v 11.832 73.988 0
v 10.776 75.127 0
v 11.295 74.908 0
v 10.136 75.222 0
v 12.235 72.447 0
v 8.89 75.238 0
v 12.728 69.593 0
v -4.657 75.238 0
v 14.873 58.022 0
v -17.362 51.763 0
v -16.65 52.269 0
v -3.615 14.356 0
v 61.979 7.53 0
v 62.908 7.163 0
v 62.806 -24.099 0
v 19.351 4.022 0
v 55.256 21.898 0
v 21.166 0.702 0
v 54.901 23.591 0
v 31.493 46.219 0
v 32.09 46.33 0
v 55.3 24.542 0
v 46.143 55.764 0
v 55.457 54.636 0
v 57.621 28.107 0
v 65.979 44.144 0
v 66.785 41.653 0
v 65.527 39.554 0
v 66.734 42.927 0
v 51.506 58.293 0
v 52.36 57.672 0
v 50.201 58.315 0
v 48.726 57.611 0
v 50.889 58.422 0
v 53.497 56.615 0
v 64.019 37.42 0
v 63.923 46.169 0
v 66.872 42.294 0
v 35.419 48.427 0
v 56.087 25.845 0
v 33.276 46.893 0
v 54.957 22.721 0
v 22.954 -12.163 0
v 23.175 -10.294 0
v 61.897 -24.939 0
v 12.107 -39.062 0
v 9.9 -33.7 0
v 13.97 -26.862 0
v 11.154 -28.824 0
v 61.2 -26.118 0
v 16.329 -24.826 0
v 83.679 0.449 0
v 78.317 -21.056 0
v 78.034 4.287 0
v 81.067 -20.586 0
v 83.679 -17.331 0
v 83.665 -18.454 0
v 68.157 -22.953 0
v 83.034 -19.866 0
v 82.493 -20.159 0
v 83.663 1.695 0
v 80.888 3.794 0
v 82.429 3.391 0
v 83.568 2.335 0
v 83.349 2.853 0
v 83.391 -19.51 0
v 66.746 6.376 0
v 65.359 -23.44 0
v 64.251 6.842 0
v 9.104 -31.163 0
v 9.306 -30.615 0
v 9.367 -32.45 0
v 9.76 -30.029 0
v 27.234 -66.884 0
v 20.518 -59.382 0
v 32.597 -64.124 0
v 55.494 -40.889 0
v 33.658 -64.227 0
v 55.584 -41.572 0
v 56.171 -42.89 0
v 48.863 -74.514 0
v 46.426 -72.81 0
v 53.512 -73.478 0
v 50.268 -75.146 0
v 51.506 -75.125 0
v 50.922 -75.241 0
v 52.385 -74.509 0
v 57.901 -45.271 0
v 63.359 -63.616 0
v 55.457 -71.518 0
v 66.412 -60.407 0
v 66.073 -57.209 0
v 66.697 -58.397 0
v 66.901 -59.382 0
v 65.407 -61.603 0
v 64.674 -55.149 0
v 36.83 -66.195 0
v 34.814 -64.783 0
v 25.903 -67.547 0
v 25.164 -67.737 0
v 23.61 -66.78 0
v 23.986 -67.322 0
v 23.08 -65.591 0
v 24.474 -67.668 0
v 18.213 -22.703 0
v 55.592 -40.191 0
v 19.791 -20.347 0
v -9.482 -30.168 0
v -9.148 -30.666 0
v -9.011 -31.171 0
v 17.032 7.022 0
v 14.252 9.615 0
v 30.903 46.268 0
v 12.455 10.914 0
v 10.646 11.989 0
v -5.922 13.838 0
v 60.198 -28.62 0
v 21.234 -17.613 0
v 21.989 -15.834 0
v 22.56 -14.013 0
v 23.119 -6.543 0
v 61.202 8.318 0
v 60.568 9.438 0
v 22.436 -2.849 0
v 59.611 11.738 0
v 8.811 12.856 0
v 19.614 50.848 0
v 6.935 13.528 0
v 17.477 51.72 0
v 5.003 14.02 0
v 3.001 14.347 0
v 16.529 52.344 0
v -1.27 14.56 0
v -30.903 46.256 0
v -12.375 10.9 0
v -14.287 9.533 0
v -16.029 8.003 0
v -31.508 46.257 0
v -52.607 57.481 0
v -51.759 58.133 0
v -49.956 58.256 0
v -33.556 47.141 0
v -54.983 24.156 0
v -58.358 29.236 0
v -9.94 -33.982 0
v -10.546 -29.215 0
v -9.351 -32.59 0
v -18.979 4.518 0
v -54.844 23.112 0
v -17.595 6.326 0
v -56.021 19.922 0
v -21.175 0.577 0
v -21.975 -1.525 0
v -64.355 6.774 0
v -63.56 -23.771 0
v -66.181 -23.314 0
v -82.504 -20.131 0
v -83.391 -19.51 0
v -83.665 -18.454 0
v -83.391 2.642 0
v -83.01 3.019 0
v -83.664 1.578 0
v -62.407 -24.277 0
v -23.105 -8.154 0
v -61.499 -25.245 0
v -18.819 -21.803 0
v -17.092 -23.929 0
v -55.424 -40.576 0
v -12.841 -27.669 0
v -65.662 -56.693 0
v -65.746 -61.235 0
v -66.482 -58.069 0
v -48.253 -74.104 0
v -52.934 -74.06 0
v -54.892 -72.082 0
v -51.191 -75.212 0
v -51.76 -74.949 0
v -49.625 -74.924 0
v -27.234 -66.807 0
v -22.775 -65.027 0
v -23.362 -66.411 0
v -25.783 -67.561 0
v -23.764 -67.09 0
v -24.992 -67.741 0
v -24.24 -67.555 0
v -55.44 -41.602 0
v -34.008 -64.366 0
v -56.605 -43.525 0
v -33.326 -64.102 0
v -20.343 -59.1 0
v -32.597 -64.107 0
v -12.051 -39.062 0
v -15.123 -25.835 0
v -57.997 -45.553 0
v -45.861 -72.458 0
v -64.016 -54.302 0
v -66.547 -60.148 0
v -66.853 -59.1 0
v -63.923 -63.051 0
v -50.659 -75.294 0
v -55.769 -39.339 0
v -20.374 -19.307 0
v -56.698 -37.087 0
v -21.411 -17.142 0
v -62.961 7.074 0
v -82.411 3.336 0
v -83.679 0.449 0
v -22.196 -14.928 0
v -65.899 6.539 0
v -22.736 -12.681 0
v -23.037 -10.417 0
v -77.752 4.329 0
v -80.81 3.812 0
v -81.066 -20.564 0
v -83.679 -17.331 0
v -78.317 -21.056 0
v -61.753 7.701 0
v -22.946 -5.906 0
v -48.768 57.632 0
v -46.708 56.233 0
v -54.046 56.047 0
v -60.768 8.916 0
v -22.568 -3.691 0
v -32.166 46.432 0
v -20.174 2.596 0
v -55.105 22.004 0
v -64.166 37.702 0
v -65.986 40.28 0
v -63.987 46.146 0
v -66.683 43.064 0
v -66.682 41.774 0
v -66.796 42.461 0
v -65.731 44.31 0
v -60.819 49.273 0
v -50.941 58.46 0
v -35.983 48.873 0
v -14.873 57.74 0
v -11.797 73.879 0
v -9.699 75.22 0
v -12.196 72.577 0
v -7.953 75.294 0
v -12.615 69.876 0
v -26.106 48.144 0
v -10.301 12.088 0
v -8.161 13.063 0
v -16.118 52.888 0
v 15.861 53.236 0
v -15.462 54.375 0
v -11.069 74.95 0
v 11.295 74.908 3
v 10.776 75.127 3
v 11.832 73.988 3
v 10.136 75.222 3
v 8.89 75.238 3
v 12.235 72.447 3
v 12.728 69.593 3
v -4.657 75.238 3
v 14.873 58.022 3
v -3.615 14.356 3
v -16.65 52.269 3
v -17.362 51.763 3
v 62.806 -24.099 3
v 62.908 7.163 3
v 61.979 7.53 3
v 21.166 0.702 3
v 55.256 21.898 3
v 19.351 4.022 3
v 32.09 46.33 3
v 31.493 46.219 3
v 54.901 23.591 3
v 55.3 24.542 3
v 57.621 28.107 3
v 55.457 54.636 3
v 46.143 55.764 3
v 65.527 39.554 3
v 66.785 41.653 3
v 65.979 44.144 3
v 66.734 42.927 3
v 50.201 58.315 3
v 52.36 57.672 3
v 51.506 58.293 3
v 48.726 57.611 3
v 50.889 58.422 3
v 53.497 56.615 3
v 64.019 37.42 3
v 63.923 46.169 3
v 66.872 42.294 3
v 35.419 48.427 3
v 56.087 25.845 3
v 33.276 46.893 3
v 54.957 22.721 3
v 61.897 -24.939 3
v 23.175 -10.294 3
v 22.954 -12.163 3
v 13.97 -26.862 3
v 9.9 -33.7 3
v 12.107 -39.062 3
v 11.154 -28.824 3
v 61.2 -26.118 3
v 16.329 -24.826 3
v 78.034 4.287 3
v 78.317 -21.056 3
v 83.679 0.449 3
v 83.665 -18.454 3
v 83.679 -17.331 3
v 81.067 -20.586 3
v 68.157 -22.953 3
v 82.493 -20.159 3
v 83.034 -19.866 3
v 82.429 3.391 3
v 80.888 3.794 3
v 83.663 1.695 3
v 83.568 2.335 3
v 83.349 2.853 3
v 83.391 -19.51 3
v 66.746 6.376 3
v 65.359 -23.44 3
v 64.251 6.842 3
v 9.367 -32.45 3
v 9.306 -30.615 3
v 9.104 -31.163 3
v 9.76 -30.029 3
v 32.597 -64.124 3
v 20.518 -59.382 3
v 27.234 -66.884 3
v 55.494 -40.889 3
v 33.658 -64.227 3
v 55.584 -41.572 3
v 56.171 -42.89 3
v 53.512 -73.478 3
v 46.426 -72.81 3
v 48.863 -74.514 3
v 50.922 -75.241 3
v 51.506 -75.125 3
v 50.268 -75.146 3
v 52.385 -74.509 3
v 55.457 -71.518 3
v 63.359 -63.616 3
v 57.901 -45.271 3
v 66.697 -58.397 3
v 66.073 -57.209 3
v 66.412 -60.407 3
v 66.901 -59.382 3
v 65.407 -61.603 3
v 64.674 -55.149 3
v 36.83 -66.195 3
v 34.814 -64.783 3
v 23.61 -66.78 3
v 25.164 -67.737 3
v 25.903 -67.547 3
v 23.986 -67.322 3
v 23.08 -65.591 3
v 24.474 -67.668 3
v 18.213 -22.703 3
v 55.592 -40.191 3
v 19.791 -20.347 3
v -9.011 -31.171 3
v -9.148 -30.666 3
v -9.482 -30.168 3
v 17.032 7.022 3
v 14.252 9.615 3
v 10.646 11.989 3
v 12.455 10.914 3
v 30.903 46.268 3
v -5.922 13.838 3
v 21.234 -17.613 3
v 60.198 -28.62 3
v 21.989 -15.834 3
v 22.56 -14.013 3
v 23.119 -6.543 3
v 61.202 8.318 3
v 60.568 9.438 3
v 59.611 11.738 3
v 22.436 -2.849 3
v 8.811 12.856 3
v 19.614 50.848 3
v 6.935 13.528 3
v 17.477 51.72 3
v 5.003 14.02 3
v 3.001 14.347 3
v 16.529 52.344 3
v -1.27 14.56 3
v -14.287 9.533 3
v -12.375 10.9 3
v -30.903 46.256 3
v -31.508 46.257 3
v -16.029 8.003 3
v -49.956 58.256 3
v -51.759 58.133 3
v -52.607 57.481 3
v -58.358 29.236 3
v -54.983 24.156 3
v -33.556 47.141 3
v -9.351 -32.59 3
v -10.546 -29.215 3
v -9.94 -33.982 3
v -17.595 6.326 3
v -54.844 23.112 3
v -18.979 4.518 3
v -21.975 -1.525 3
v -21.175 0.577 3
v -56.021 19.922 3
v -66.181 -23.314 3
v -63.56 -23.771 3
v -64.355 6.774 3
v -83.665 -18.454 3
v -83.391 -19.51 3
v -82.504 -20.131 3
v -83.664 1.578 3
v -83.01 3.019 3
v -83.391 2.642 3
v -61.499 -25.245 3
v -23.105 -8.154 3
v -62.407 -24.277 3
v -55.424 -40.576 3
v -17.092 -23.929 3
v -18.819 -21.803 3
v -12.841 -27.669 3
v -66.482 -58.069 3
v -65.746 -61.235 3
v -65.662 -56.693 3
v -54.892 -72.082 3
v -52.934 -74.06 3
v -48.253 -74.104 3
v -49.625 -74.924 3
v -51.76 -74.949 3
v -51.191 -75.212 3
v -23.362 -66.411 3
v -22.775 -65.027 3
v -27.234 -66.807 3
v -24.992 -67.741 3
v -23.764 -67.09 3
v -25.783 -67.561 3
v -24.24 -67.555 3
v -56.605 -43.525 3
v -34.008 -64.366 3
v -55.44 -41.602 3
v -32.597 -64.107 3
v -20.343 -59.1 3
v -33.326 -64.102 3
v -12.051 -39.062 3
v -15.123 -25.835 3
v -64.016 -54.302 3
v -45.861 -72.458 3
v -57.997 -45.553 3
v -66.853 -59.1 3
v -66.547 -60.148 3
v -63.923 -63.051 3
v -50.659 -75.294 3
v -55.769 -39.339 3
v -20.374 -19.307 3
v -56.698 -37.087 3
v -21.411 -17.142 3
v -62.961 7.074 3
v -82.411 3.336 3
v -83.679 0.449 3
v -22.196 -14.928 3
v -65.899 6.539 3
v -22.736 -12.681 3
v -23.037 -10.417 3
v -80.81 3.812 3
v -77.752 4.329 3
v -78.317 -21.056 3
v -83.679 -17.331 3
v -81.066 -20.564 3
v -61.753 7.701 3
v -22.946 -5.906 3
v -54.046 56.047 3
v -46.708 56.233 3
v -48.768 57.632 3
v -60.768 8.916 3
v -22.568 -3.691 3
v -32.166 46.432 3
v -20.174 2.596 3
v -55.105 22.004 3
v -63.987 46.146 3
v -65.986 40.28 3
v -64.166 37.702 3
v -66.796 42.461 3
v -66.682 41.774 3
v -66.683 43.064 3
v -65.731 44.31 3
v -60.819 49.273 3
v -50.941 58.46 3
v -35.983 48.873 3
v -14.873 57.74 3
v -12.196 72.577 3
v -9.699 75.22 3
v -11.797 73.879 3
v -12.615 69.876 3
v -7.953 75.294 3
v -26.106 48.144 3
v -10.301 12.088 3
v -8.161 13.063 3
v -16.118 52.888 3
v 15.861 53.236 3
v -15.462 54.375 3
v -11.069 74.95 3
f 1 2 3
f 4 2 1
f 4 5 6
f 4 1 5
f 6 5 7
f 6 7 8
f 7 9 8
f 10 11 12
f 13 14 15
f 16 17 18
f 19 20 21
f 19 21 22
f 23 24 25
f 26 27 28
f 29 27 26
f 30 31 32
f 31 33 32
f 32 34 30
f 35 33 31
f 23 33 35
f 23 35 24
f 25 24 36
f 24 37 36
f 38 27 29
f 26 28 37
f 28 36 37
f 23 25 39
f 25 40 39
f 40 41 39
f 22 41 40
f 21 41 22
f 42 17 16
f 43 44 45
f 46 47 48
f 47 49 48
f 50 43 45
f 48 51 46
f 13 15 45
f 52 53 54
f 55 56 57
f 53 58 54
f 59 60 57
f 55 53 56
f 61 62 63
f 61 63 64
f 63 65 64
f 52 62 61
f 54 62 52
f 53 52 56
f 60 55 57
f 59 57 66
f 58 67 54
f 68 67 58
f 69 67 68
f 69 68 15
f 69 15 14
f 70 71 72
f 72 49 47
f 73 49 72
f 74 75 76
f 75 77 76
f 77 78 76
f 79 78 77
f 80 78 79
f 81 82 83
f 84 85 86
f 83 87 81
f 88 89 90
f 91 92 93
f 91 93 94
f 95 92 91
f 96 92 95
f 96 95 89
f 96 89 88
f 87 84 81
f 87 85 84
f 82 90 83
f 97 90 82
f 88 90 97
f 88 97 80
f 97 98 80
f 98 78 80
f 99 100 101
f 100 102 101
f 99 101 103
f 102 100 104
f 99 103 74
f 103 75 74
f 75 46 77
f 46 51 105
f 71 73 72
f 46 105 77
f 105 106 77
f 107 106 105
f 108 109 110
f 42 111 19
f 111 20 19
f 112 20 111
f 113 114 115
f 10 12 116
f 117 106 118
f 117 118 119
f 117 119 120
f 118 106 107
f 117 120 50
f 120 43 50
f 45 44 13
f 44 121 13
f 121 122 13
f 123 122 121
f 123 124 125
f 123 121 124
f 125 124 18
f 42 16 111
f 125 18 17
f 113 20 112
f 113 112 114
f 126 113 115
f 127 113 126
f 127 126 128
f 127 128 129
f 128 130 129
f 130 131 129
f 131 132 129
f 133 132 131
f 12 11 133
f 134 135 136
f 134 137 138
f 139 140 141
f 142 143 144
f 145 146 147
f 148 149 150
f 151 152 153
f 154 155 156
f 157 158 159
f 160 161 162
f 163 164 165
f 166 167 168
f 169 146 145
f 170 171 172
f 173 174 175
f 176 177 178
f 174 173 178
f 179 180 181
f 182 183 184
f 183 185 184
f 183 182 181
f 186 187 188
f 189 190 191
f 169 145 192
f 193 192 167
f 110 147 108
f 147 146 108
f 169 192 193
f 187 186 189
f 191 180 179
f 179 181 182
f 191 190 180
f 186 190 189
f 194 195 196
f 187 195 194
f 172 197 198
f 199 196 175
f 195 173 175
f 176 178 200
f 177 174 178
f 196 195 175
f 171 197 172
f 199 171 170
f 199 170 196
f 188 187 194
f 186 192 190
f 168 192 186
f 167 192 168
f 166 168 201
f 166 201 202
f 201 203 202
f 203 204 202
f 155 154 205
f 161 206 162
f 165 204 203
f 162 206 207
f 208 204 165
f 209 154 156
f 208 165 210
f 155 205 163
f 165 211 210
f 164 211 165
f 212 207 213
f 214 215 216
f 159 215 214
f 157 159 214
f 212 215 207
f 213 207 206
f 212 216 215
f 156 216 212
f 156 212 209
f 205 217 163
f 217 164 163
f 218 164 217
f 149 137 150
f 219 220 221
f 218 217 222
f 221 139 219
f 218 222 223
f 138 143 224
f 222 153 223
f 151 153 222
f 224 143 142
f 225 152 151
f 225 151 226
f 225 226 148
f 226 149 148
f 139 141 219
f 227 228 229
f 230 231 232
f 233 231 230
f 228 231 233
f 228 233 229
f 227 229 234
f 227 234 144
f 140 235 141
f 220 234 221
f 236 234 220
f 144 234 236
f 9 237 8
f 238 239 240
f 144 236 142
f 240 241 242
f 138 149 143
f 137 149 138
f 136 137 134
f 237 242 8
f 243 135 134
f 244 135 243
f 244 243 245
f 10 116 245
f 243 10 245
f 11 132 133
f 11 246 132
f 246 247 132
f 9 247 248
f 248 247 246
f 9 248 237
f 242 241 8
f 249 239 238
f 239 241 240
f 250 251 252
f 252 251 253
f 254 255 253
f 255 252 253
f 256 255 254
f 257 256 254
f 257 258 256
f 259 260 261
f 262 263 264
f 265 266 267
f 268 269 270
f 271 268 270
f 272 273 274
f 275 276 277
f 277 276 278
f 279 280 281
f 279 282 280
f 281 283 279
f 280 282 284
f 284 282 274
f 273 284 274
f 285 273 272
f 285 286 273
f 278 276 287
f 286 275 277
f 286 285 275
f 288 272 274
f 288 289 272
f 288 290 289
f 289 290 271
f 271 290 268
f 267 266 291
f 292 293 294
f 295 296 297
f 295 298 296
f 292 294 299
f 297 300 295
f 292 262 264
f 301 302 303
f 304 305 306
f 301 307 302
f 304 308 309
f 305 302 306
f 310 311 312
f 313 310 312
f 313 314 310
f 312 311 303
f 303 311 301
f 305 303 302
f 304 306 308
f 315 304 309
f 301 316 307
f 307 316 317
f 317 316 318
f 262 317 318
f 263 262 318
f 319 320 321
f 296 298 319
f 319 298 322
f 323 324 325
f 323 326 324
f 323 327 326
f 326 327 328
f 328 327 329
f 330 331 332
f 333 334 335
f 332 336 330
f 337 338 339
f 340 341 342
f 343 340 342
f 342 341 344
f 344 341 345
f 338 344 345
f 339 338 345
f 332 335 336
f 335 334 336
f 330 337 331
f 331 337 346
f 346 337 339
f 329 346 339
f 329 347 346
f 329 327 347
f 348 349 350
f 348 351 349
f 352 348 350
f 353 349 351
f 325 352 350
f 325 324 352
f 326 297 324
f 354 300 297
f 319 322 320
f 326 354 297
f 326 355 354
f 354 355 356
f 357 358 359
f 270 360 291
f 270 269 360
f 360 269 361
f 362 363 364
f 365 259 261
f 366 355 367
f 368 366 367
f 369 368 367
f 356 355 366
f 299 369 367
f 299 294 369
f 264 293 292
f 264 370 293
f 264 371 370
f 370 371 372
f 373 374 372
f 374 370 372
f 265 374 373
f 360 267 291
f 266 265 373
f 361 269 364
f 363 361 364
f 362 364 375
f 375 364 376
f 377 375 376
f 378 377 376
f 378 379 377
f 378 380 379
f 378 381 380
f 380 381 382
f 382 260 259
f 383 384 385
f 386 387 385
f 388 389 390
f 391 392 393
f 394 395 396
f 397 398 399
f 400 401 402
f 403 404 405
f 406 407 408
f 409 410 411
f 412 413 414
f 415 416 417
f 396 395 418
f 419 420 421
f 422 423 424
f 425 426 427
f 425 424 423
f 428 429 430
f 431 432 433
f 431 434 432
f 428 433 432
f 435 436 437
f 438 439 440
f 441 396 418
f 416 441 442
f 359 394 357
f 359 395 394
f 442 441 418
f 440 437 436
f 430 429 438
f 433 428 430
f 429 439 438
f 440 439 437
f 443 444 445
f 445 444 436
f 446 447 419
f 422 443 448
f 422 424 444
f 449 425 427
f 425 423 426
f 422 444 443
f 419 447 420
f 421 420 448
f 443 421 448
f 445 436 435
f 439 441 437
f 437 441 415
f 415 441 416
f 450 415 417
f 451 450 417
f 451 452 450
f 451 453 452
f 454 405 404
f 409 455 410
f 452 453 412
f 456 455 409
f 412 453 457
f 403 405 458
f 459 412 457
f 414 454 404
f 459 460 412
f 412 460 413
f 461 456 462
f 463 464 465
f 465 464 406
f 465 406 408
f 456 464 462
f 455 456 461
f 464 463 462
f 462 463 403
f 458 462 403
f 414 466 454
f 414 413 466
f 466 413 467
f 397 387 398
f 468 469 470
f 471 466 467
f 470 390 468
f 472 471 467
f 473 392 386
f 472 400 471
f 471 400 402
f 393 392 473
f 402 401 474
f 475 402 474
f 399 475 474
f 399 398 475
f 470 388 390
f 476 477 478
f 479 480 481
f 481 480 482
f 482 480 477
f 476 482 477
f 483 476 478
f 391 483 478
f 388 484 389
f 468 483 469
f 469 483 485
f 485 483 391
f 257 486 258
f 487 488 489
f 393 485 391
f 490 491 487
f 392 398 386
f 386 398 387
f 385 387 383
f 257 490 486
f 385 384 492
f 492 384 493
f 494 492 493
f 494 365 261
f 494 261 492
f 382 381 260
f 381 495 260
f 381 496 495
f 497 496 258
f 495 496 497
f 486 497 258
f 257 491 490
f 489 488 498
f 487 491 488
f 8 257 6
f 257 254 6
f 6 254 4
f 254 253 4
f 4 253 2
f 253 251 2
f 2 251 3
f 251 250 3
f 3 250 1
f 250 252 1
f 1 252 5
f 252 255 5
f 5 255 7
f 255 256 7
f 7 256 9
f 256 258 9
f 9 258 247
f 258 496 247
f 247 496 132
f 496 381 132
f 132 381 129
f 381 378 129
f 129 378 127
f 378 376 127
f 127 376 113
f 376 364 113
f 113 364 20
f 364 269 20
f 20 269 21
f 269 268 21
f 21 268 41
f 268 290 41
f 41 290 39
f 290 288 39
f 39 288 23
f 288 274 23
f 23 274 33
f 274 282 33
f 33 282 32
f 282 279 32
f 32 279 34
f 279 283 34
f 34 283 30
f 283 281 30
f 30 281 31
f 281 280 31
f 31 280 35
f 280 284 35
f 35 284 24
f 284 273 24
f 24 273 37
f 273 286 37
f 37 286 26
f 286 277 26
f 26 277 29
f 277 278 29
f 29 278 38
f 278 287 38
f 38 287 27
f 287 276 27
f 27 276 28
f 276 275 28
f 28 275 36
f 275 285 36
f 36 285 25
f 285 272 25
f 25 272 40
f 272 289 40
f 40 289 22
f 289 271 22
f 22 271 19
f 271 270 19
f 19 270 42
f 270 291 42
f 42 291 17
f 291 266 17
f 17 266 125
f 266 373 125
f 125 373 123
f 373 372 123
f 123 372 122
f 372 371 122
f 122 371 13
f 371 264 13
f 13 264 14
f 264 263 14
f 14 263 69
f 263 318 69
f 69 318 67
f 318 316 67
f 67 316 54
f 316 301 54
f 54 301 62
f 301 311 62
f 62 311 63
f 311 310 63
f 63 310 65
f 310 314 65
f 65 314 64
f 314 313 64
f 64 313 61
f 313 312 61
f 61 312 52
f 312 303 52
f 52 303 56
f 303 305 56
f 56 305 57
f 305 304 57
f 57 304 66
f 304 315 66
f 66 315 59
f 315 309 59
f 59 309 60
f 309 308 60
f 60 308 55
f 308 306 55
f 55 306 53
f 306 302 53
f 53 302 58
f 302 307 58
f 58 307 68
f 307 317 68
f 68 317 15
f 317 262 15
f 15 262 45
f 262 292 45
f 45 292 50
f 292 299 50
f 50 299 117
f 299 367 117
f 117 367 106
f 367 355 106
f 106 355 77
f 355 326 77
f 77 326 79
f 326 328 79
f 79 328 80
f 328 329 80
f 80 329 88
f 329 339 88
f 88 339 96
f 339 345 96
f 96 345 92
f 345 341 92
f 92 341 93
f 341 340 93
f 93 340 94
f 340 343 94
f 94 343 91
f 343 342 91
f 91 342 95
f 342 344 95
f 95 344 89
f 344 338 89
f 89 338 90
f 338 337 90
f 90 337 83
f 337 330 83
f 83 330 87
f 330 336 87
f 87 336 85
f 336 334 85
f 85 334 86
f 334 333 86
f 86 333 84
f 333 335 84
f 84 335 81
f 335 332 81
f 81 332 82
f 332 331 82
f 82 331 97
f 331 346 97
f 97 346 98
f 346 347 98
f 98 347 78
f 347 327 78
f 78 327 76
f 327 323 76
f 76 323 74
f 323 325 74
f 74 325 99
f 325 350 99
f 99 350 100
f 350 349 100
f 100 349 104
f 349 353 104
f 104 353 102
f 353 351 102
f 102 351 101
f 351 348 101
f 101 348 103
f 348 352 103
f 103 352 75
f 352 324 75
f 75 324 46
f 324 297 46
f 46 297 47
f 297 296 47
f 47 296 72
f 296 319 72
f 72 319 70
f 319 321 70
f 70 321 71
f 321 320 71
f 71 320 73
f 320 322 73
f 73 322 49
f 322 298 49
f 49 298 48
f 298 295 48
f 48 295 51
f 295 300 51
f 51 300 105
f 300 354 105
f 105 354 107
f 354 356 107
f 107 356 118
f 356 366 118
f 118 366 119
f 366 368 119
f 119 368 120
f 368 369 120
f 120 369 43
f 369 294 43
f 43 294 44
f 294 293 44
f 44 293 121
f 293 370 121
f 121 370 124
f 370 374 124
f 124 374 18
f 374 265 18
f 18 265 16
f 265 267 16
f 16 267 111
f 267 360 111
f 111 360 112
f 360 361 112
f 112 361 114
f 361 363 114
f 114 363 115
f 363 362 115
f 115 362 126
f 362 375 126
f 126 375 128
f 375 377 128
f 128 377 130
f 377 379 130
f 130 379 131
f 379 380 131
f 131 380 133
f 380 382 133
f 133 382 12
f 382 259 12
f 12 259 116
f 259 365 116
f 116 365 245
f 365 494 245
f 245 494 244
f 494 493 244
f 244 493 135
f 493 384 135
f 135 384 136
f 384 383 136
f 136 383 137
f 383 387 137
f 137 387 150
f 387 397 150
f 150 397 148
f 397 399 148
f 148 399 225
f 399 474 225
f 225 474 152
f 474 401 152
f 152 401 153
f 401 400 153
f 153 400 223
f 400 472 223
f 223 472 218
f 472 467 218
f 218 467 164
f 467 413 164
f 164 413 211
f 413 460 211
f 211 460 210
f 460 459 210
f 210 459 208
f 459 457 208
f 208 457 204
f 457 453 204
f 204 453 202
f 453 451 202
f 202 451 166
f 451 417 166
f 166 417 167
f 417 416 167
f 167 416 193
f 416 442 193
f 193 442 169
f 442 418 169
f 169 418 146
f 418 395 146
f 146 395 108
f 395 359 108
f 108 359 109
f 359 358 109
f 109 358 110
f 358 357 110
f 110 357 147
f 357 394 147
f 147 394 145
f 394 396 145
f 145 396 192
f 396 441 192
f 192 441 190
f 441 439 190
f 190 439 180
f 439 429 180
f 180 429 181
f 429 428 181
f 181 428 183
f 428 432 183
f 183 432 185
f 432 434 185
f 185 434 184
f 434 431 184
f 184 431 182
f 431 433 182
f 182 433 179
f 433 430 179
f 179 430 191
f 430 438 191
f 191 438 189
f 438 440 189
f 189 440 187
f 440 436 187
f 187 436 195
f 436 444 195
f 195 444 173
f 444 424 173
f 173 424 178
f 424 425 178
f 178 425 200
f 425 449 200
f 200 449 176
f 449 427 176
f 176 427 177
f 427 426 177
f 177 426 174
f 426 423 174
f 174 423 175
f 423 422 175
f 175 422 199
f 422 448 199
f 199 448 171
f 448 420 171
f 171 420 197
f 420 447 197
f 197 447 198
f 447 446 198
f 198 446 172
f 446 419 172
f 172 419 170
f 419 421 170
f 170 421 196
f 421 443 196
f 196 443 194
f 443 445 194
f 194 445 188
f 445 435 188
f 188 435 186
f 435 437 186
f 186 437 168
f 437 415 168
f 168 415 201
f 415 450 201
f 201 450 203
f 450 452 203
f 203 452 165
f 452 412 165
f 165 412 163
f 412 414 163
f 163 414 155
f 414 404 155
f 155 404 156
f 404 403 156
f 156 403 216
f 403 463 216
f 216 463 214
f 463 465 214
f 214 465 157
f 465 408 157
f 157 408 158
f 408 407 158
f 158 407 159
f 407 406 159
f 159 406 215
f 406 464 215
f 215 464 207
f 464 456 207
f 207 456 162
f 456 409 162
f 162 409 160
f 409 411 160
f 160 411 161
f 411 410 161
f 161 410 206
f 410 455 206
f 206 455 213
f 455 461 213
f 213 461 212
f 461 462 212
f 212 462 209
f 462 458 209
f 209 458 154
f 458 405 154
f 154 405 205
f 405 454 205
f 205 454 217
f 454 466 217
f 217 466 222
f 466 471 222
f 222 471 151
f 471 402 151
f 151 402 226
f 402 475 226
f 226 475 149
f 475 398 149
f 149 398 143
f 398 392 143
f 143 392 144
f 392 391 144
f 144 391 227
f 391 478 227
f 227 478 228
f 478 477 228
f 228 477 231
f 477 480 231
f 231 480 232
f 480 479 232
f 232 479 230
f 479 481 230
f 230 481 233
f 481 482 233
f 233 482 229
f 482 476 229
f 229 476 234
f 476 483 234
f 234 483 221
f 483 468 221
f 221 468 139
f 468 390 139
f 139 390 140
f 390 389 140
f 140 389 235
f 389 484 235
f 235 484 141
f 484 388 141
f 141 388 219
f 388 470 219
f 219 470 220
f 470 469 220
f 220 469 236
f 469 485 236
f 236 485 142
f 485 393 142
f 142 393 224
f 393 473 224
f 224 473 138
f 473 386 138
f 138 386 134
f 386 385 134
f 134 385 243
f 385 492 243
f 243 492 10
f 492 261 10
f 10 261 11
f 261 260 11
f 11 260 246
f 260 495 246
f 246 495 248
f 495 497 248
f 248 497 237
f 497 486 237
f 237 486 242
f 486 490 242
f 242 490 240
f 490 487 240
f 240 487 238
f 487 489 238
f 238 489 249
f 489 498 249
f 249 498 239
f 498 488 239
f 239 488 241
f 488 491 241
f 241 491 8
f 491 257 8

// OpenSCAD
// Module names are of the form poly_<inkscape-path-id>().  As a result,
// you can associate a polygon in this OpenSCAD program with the corresponding
// SVG element in the Inkscape document by looking for the XML element with
// the attribute id="inkscape-path-id".

module oshwlogo800px(h=3)
{
  scale([25.4/90, -25.4/90, 1]) union()
  {
    linear_extrude(height=h)
      polygon([[-16.500000,-266.590625],[31.500000,-266.590625],[35.913750,-266.534375],[38.183906,-266.198281],[40.020000,-265.420625],[41.923281,-262.160625],[43.351250,-256.703125],[45.100000,-246.590625],[52.700000,-205.590625],[56.200000,-188.630625],[58.567813,-185.469375],[61.927500,-183.260625],[69.500000,-180.170625],[109.500000,-163.940625],[111.590645,-163.768535],[113.705781,-164.161406],[117.908750,-166.156875],[125.500000,-171.590625],[163.500000,-197.590625],[172.651250,-204.133125],[177.878906,-206.627187],[180.314082,-207.006445],[182.500000,-206.550625],[185.527031,-204.348437],[189.556250,-200.603125],[196.500000,-193.590625],[226.500000,-163.590625],[233.782500,-156.415625],[236.459063,-152.104375],[236.948320,-149.859687],[236.640000,-147.590625],[232.182500,-140.150625],[226.840000,-132.590625],[204.170000,-99.590625],[198.735000,-91.575625],[195.943438,-86.959688],[194.530000,-83.590625],[194.728750,-80.508125],[195.790000,-77.590625],[211.220000,-41.590625],[214.612500,-33.441875],[216.859063,-29.472969],[219.610000,-26.680625],[222.902969,-25.382031],[227.661250,-24.241875],[236.500000,-22.590625],[276.500000,-15.190625],[286.612500,-13.441875],[292.070000,-12.013906],[295.330000,-10.110625],[296.107656,-8.274531],[296.443750,-6.004375],[296.500000,-1.590625],[296.500000,61.409375],[296.451250,65.389375],[295.480000,69.129375],[294.216465,70.392695],[292.297969,71.428438],[287.243750,72.941875],[277.500000,74.609375],[241.500000,81.329375],[231.588750,83.055625],[222.540000,85.389375],[219.320156,88.367812],[216.851250,92.544375],[213.300000,101.409375],[196.980000,142.409375],[196.633398,144.880859],[196.950313,147.303125],[199.030000,151.971875],[205.160000,160.409375],[229.160000,195.409375],[234.117500,202.710625],[236.329062,206.919531],[237.050000,210.409375],[235.319687,214.041250],[231.757500,218.276875],[224.500000,225.409375],[196.500000,253.409375],[189.608750,260.354375],[185.617031,264.009687],[182.500000,266.189375],[180.431699,266.602383],[178.116719,266.266563],[173.136250,264.024375],[164.500000,257.989375],[130.500000,234.549375],[123.356250,229.544375],[119.259844,227.577187],[115.500000,227.209375],[96.500000,236.989375],[91.782500,239.339375],[89.162188,240.012813],[86.720000,239.769375],[84.989063,238.543438],[83.657500,236.621875],[81.780000,232.409375],[72.700000,210.409375],[42.900000,138.409375],[35.080000,119.409375],[33.190000,114.981875],[32.260000,110.419375],[32.972891,108.478281],[34.582500,106.401250],[39.522500,102.131875],[49.500000,95.179375],[57.860156,87.966563],[64.533750,80.444375],[70.125469,72.097188],[75.240000,62.409375],[77.913306,56.103069],[79.938008,49.652520],[81.332534,43.096531],[82.115312,36.473906],[81.919336,23.183965],[79.497500,10.093125],[74.997227,-2.488184],[68.565938,-14.249531],[60.351055,-24.880488],[50.500000,-34.070625],[44.132363,-38.671934],[37.722656,-42.482344],[31.219434,-45.552832],[24.571250,-47.934375],[17.726660,-49.677949],[10.634219,-50.834531],[-4.500000,-51.590625],[-12.808906,-50.868750],[-20.983750,-49.033125],[-28.916719,-46.286250],[-36.500000,-42.830625],[-43.849888,-38.623169],[-50.622070,-33.779414],[-56.794077,-28.357280],[-62.343437,-22.414687],[-67.247681,-16.009556],[-71.484336,-9.199805],[-75.030933,-2.043354],[-77.865000,5.401875],[-79.964067,13.077964],[-81.305664,20.926992],[-81.867319,28.891040],[-81.626563,36.912188],[-80.560923,44.932515],[-78.647930,52.894102],[-75.865112,60.739028],[-72.190000,68.409375],[-66.680937,77.253594],[-60.562500,84.788125],[-53.585312,91.540781],[-45.500000,98.039375],[-37.368750,103.516875],[-33.598906,106.893125],[-32.412598,108.660234],[-31.930000,110.449375],[-33.132500,115.478125],[-35.220000,120.409375],[-42.700000,138.409375],[-72.080000,209.409375],[-80.700000,230.409375],[-82.777500,235.313125],[-84.204375,237.720469],[-85.890000,239.369375],[-88.556094,240.028281],[-91.356250,239.390625],[-96.500000,236.719375],[-115.500000,227.149375],[-118.082500,227.133125],[-120.500000,228.069375],[-162.500000,256.739375],[-170.973750,262.574375],[-175.838281,265.477812],[-179.500000,266.789375],[-181.384844,266.498496],[-183.401875,265.566719],[-187.562500,262.415625],[-194.500000,255.409375],[-226.500000,223.409375],[-232.957500,216.975625],[-235.795312,213.122656],[-236.880000,209.409375],[-235.567031,205.754688],[-232.661250,200.879375],[-226.830000,192.409375],[-205.500000,161.409375],[-200.568750,154.221875],[-196.440000,147.409375],[-196.385938,143.771719],[-197.605000,139.390625],[-200.900000,131.409375],[-217.910000,89.449375],[-221.127969,86.020938],[-225.211250,84.229375],[-234.500000,82.609375],[-277.500000,74.609375],[-287.240000,72.863125],[-292.338750,71.331406],[-295.480000,69.129375],[-296.451250,65.389375],[-296.500000,61.409375],[-296.500000,-1.590625],[-296.447500,-5.591875],[-295.480000,-9.360625],[-294.130527,-10.698750],[-292.007969,-11.819375],[-286.333750,-13.505625],[-275.500000,-15.340625],[-233.500000,-23.170625],[-228.029687,-24.003906],[-223.090000,-25.066875],[-218.810313,-27.286719],[-215.320000,-31.590625],[-198.500000,-70.590625],[-195.253750,-77.966875],[-194.330469,-81.892656],[-194.820000,-85.590625],[-206.780000,-103.590625],[-227.360000,-133.590625],[-233.807500,-142.723125],[-236.275625,-148.018750],[-236.677656,-150.451875],[-236.280000,-152.590625],[-232.905156,-157.004062],[-226.726250,-163.508125],[-215.500000,-174.590625],[-191.500000,-198.590625],[-186.401250,-203.671875],[-183.398594,-205.983281],[-180.500000,-207.140625],[-177.010156,-206.419688],[-172.801250,-204.208125],[-165.500000,-199.250625],[-127.500000,-173.170625],[-118.897500,-167.035625],[-113.974688,-164.522188],[-111.640898,-163.903555],[-109.500000,-163.900625],[-92.500000,-170.590625],[-61.520000,-183.410625],[-58.996719,-185.205820],[-57.110000,-187.397812],[-54.785000,-192.665625],[-52.700000,-204.590625],[-44.700000,-247.590625],[-43.212500,-257.161875],[-41.800313,-261.775469],[-39.220000,-265.570625],[-34.366406,-266.527344],[-28.178750,-266.789375],[-16.500000,-266.590625]]);
  }
}

oshwlogo800px(h=3);
